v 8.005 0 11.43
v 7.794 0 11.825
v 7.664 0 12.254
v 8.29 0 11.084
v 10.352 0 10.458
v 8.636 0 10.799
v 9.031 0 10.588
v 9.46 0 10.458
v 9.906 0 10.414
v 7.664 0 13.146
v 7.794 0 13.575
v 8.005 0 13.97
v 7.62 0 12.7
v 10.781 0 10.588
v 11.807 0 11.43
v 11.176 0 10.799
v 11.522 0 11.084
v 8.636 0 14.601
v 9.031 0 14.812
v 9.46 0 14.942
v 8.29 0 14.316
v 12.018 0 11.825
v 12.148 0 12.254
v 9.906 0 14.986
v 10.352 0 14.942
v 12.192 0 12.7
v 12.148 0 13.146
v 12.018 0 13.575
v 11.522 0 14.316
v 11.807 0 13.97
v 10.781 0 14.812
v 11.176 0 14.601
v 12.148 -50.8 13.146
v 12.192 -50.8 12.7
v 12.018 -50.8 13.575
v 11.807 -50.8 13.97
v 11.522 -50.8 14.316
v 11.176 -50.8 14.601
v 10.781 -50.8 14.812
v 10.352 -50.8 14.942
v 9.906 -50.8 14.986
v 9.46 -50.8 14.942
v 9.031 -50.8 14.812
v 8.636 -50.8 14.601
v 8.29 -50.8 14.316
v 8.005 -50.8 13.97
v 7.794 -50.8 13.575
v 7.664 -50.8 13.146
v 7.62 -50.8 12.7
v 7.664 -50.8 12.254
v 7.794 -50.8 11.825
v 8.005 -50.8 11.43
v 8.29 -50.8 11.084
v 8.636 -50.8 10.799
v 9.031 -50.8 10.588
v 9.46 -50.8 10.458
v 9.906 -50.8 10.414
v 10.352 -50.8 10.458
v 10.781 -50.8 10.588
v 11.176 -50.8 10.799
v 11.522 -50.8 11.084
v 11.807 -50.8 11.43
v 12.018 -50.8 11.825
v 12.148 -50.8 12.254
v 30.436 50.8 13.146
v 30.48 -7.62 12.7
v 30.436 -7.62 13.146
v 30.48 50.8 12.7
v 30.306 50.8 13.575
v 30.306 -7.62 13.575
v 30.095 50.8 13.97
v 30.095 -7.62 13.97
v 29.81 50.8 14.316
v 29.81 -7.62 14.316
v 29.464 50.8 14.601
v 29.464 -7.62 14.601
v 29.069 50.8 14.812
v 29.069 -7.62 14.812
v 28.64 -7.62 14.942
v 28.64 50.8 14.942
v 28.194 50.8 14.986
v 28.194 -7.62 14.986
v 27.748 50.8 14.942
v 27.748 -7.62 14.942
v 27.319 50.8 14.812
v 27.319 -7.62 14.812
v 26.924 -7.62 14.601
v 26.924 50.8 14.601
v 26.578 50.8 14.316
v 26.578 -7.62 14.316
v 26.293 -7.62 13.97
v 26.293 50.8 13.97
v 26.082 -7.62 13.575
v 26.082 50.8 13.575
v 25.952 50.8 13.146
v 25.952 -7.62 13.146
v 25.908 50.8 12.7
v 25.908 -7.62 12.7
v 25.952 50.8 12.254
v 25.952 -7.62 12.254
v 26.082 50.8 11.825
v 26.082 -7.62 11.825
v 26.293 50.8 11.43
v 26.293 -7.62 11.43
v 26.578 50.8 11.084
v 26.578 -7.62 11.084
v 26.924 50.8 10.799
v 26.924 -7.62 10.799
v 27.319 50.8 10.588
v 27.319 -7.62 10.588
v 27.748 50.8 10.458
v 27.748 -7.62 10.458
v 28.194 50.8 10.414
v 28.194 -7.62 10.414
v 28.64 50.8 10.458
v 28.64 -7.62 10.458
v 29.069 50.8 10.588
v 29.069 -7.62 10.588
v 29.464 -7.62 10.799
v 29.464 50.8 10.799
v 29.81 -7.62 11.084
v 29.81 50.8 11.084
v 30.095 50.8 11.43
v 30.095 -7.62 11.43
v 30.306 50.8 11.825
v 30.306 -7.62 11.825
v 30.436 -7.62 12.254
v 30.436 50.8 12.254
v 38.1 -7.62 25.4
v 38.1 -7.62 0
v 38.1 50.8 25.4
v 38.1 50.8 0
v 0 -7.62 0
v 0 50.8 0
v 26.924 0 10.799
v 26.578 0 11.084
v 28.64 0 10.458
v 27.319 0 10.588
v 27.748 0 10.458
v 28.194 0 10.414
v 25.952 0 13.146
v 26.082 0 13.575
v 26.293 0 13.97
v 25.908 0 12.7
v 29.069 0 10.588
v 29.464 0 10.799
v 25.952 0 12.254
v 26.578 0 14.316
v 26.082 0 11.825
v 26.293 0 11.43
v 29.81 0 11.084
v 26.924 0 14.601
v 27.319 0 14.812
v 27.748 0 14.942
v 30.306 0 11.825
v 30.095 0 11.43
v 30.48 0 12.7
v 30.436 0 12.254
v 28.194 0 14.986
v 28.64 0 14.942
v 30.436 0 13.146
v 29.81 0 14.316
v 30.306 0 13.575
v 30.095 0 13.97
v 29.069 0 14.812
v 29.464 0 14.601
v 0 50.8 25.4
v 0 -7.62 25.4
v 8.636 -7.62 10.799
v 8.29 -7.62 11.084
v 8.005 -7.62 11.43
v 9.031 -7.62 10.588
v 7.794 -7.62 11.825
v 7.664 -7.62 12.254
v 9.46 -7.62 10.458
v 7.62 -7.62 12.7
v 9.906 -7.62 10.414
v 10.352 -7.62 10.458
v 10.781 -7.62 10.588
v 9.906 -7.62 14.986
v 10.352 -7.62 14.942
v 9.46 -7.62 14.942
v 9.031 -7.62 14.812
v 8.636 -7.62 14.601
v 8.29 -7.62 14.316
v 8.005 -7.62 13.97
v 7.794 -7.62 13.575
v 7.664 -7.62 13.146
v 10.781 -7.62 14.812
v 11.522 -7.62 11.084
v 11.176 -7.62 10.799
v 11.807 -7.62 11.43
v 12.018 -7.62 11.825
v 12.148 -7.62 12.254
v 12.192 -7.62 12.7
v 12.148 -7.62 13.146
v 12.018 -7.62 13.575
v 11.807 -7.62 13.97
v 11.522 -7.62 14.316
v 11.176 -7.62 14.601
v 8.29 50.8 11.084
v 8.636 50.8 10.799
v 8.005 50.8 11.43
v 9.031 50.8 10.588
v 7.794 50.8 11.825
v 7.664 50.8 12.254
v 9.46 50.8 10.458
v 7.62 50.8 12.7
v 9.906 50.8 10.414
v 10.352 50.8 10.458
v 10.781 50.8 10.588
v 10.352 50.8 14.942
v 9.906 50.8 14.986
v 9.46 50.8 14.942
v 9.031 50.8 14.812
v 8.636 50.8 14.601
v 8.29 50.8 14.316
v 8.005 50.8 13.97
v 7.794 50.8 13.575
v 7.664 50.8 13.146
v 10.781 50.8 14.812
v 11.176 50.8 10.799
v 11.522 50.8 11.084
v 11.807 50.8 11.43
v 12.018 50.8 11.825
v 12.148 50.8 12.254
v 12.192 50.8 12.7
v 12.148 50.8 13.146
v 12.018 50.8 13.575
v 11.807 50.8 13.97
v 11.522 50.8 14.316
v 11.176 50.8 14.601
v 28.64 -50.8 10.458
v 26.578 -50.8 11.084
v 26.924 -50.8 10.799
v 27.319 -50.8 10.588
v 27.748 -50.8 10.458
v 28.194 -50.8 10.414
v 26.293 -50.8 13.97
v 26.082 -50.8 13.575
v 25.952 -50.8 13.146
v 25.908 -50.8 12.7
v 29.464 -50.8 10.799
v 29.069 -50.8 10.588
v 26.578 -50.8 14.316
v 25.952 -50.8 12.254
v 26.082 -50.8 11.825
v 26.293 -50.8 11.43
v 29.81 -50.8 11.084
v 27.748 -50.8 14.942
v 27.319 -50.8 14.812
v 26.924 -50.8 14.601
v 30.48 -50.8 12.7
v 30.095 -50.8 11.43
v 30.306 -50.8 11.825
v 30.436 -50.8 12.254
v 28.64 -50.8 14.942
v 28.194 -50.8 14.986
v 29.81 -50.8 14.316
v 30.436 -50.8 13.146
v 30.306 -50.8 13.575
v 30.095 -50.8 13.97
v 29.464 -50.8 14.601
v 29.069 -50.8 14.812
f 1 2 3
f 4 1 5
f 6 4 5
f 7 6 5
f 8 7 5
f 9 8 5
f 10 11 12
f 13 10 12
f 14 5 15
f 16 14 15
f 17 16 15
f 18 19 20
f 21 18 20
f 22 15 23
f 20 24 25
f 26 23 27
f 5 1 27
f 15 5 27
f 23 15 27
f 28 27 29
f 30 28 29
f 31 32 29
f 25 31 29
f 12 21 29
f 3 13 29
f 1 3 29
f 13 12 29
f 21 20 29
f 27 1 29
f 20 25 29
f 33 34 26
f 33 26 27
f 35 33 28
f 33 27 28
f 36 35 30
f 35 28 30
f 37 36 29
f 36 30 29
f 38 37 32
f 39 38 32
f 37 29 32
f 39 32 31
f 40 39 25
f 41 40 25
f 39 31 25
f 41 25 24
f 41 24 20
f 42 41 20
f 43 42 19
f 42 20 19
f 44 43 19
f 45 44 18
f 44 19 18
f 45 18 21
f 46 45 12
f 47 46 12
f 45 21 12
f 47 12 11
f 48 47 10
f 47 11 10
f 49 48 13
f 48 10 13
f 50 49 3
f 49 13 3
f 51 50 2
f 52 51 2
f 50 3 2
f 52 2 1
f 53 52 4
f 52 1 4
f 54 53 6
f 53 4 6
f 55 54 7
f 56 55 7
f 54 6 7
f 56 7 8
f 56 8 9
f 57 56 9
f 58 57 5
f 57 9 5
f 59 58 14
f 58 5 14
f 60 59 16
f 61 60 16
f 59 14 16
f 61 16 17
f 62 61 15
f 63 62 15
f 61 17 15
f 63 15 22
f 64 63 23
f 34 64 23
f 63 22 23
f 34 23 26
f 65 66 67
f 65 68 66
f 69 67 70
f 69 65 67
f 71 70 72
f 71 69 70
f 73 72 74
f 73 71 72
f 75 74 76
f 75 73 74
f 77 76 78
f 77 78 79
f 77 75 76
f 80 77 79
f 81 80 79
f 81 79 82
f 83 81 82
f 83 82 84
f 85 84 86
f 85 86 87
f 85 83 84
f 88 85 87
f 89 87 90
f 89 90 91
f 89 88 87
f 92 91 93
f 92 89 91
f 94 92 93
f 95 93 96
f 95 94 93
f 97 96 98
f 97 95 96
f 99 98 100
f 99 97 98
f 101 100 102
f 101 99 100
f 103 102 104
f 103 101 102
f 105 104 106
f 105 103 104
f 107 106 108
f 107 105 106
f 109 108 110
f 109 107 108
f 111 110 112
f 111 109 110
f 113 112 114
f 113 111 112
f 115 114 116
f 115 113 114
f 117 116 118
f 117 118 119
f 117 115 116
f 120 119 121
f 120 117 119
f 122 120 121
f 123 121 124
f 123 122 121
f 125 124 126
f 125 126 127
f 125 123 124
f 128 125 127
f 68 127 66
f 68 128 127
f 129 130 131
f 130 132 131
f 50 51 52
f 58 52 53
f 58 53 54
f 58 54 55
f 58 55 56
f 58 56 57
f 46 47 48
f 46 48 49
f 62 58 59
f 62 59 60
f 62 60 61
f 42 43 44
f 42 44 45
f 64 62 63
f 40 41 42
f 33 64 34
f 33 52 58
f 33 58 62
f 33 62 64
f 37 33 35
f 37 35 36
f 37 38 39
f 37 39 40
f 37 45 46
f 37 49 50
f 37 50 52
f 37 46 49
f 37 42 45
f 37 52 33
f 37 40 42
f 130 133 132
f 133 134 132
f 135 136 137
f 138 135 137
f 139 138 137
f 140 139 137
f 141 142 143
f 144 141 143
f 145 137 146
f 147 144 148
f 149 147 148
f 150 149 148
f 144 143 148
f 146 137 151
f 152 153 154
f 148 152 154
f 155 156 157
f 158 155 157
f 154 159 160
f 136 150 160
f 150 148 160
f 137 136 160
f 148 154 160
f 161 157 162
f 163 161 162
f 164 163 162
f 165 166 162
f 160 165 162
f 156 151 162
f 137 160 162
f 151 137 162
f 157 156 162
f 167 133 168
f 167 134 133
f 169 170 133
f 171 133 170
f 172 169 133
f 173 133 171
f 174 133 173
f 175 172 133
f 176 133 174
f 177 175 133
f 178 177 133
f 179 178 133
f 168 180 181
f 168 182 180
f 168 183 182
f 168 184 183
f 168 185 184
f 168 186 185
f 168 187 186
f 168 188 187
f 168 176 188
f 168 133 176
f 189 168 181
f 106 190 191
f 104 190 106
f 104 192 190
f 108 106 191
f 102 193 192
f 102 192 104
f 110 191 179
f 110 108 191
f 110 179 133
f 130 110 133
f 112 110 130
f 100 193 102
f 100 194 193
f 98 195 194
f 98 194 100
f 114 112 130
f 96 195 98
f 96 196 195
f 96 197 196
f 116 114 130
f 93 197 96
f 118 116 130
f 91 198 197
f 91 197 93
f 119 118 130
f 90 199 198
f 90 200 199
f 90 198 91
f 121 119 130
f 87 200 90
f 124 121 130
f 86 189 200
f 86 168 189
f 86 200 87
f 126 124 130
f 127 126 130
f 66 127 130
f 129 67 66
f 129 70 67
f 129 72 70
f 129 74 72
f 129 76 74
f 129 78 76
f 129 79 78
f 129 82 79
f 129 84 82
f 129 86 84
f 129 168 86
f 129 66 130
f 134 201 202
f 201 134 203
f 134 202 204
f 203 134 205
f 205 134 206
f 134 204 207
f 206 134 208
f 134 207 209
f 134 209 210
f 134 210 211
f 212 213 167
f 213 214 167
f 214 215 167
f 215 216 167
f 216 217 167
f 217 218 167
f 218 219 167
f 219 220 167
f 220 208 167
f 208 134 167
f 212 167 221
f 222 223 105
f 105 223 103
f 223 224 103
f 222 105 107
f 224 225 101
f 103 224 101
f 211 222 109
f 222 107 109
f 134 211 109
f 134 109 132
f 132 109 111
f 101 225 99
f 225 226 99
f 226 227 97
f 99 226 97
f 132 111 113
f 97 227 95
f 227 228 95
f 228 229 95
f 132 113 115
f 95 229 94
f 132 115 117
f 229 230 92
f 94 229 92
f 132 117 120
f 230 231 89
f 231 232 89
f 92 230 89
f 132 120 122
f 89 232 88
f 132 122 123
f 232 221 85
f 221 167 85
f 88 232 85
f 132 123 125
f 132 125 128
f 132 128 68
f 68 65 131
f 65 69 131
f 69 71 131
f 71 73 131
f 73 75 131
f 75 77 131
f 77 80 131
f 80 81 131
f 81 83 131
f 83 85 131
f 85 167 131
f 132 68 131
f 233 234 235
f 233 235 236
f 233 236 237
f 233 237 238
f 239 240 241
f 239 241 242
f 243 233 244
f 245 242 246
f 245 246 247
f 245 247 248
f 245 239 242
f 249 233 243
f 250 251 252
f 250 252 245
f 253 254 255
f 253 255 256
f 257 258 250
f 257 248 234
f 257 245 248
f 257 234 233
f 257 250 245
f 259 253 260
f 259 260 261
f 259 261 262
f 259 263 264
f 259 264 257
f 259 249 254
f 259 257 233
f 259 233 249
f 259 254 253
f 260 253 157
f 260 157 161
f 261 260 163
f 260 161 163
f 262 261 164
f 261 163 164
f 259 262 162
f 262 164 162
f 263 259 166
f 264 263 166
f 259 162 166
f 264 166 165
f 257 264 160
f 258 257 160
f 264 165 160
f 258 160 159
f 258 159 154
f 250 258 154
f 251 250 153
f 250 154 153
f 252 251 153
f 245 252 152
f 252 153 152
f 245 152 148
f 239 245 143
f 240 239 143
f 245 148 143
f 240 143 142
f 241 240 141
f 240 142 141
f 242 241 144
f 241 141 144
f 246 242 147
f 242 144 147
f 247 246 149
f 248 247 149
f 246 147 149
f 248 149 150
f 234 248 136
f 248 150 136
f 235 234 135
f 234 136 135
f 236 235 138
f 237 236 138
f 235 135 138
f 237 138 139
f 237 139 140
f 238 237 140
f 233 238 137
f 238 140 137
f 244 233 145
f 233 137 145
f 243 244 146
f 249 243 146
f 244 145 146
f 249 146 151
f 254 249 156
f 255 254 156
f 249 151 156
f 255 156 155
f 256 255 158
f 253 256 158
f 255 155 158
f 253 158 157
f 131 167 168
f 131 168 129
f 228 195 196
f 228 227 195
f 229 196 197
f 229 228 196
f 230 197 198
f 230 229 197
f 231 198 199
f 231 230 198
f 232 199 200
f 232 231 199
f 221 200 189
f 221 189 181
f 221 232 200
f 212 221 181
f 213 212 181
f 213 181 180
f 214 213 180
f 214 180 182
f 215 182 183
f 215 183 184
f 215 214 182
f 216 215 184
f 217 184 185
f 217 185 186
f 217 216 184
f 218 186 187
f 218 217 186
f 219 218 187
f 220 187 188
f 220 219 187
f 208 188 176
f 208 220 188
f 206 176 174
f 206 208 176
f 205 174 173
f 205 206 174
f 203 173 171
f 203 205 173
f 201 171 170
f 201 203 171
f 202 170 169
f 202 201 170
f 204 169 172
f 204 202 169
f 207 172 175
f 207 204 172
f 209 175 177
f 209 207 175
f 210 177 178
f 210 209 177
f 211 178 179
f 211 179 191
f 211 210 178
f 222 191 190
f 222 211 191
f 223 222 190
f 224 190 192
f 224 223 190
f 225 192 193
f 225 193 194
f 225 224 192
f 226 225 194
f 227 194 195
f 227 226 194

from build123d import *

# Parameters (mm, degrees)
F0_R          = 2.286
F1_DEPTH      = 50.8
F0_W          = 38.1
F0_H          = 25.4
F2_DEPTH      = 50.8
F2_DEPTH_BACK = 7.62


with BuildPart() as f1:
    # F0 (on Front) → F1 (new body)
    with BuildSketch(Plane.XZ):
        with Locations((9.906, 12.7)):
            Circle(F0_R)
    extrude(amount=F1_DEPTH)


with BuildPart() as f1b:
    # F0 (on Front) → F1, piece 2 (new body)
    with BuildSketch(Plane.XZ):
        with Locations((28.194, 12.7)):
            Circle(F0_R)
    extrude(amount=F1_DEPTH)


with BuildPart() as f2:
    # F0 (on Front) → F2 (new body, two sides)
    with BuildSketch(Plane.XZ) as f2_sk:
        with Locations((19.05, 12.7)):
            Rectangle(F0_W, F0_H)
        with Locations((9.906, 12.7)):
            Circle(F0_R, mode=Mode.SUBTRACT)
        with Locations((28.194, 12.7)):
            Circle(F0_R, mode=Mode.SUBTRACT)
    extrude(amount=-F2_DEPTH)
    extrude(f2_sk.sketch, amount=F2_DEPTH_BACK)


solid = Compound([f1.part, f1b.part, f2.part])
